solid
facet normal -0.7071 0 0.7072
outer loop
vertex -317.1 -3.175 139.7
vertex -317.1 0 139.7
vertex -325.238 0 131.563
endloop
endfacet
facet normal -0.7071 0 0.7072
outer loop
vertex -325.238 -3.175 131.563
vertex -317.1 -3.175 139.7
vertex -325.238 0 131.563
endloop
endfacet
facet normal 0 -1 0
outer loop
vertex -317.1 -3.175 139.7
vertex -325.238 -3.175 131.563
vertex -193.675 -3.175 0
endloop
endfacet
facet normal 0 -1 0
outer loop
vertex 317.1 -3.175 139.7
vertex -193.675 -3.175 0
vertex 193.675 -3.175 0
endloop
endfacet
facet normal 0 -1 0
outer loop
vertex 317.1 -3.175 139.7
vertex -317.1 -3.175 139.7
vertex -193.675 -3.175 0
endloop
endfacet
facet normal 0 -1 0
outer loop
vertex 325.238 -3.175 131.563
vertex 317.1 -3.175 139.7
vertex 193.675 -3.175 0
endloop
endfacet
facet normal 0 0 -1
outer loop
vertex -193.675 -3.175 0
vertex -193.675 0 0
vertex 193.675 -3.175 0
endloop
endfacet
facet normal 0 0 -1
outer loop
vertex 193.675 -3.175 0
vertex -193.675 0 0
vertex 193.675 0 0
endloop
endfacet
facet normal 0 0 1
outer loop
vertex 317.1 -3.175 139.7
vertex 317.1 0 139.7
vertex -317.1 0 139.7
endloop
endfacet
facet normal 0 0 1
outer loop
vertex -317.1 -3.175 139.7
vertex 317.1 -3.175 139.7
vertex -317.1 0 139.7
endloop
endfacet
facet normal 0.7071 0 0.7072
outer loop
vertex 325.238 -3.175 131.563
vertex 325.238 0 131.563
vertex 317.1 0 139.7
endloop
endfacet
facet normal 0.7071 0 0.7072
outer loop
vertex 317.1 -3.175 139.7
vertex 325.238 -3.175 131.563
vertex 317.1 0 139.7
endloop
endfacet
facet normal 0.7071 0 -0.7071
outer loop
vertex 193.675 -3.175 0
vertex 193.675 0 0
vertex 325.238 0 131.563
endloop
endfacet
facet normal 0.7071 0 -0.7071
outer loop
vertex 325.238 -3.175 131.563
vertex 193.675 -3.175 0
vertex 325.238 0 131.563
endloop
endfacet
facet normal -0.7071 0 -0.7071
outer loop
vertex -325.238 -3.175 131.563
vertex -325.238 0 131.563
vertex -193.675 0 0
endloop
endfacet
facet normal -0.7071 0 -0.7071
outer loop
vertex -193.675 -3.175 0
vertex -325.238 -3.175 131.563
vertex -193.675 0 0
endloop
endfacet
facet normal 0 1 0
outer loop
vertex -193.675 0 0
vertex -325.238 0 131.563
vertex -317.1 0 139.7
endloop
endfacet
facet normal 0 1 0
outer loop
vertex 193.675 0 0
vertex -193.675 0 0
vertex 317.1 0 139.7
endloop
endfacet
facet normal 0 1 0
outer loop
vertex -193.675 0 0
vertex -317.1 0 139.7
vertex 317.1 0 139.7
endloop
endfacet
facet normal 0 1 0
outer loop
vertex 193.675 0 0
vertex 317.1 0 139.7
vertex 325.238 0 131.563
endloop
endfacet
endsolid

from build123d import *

# Parameters (mm, degrees)
F1_DEPTH = 3.175


# Not quite as in the source:
# - a length typed as a fraction of an inch, garbled in the dataset ("3 / 203.2 mm" for 3/8 in), is restored


with BuildPart() as f1:
    # F0 (on Front) → F1 (new body)
    with BuildSketch(Plane.XZ):
        Polygon((-193.675, 0), (0, 0), (0, 139.7), (-317.1003863096, 139.7), (-325.2376931548, 131.5626931548), align=None)
        Polygon((0, 139.7), (0, 0), (193.675, 0), (325.2376931548, 131.5626931548), (317.1003863096, 139.7), align=None)
    extrude(amount=F1_DEPTH)


solid = f1.part
